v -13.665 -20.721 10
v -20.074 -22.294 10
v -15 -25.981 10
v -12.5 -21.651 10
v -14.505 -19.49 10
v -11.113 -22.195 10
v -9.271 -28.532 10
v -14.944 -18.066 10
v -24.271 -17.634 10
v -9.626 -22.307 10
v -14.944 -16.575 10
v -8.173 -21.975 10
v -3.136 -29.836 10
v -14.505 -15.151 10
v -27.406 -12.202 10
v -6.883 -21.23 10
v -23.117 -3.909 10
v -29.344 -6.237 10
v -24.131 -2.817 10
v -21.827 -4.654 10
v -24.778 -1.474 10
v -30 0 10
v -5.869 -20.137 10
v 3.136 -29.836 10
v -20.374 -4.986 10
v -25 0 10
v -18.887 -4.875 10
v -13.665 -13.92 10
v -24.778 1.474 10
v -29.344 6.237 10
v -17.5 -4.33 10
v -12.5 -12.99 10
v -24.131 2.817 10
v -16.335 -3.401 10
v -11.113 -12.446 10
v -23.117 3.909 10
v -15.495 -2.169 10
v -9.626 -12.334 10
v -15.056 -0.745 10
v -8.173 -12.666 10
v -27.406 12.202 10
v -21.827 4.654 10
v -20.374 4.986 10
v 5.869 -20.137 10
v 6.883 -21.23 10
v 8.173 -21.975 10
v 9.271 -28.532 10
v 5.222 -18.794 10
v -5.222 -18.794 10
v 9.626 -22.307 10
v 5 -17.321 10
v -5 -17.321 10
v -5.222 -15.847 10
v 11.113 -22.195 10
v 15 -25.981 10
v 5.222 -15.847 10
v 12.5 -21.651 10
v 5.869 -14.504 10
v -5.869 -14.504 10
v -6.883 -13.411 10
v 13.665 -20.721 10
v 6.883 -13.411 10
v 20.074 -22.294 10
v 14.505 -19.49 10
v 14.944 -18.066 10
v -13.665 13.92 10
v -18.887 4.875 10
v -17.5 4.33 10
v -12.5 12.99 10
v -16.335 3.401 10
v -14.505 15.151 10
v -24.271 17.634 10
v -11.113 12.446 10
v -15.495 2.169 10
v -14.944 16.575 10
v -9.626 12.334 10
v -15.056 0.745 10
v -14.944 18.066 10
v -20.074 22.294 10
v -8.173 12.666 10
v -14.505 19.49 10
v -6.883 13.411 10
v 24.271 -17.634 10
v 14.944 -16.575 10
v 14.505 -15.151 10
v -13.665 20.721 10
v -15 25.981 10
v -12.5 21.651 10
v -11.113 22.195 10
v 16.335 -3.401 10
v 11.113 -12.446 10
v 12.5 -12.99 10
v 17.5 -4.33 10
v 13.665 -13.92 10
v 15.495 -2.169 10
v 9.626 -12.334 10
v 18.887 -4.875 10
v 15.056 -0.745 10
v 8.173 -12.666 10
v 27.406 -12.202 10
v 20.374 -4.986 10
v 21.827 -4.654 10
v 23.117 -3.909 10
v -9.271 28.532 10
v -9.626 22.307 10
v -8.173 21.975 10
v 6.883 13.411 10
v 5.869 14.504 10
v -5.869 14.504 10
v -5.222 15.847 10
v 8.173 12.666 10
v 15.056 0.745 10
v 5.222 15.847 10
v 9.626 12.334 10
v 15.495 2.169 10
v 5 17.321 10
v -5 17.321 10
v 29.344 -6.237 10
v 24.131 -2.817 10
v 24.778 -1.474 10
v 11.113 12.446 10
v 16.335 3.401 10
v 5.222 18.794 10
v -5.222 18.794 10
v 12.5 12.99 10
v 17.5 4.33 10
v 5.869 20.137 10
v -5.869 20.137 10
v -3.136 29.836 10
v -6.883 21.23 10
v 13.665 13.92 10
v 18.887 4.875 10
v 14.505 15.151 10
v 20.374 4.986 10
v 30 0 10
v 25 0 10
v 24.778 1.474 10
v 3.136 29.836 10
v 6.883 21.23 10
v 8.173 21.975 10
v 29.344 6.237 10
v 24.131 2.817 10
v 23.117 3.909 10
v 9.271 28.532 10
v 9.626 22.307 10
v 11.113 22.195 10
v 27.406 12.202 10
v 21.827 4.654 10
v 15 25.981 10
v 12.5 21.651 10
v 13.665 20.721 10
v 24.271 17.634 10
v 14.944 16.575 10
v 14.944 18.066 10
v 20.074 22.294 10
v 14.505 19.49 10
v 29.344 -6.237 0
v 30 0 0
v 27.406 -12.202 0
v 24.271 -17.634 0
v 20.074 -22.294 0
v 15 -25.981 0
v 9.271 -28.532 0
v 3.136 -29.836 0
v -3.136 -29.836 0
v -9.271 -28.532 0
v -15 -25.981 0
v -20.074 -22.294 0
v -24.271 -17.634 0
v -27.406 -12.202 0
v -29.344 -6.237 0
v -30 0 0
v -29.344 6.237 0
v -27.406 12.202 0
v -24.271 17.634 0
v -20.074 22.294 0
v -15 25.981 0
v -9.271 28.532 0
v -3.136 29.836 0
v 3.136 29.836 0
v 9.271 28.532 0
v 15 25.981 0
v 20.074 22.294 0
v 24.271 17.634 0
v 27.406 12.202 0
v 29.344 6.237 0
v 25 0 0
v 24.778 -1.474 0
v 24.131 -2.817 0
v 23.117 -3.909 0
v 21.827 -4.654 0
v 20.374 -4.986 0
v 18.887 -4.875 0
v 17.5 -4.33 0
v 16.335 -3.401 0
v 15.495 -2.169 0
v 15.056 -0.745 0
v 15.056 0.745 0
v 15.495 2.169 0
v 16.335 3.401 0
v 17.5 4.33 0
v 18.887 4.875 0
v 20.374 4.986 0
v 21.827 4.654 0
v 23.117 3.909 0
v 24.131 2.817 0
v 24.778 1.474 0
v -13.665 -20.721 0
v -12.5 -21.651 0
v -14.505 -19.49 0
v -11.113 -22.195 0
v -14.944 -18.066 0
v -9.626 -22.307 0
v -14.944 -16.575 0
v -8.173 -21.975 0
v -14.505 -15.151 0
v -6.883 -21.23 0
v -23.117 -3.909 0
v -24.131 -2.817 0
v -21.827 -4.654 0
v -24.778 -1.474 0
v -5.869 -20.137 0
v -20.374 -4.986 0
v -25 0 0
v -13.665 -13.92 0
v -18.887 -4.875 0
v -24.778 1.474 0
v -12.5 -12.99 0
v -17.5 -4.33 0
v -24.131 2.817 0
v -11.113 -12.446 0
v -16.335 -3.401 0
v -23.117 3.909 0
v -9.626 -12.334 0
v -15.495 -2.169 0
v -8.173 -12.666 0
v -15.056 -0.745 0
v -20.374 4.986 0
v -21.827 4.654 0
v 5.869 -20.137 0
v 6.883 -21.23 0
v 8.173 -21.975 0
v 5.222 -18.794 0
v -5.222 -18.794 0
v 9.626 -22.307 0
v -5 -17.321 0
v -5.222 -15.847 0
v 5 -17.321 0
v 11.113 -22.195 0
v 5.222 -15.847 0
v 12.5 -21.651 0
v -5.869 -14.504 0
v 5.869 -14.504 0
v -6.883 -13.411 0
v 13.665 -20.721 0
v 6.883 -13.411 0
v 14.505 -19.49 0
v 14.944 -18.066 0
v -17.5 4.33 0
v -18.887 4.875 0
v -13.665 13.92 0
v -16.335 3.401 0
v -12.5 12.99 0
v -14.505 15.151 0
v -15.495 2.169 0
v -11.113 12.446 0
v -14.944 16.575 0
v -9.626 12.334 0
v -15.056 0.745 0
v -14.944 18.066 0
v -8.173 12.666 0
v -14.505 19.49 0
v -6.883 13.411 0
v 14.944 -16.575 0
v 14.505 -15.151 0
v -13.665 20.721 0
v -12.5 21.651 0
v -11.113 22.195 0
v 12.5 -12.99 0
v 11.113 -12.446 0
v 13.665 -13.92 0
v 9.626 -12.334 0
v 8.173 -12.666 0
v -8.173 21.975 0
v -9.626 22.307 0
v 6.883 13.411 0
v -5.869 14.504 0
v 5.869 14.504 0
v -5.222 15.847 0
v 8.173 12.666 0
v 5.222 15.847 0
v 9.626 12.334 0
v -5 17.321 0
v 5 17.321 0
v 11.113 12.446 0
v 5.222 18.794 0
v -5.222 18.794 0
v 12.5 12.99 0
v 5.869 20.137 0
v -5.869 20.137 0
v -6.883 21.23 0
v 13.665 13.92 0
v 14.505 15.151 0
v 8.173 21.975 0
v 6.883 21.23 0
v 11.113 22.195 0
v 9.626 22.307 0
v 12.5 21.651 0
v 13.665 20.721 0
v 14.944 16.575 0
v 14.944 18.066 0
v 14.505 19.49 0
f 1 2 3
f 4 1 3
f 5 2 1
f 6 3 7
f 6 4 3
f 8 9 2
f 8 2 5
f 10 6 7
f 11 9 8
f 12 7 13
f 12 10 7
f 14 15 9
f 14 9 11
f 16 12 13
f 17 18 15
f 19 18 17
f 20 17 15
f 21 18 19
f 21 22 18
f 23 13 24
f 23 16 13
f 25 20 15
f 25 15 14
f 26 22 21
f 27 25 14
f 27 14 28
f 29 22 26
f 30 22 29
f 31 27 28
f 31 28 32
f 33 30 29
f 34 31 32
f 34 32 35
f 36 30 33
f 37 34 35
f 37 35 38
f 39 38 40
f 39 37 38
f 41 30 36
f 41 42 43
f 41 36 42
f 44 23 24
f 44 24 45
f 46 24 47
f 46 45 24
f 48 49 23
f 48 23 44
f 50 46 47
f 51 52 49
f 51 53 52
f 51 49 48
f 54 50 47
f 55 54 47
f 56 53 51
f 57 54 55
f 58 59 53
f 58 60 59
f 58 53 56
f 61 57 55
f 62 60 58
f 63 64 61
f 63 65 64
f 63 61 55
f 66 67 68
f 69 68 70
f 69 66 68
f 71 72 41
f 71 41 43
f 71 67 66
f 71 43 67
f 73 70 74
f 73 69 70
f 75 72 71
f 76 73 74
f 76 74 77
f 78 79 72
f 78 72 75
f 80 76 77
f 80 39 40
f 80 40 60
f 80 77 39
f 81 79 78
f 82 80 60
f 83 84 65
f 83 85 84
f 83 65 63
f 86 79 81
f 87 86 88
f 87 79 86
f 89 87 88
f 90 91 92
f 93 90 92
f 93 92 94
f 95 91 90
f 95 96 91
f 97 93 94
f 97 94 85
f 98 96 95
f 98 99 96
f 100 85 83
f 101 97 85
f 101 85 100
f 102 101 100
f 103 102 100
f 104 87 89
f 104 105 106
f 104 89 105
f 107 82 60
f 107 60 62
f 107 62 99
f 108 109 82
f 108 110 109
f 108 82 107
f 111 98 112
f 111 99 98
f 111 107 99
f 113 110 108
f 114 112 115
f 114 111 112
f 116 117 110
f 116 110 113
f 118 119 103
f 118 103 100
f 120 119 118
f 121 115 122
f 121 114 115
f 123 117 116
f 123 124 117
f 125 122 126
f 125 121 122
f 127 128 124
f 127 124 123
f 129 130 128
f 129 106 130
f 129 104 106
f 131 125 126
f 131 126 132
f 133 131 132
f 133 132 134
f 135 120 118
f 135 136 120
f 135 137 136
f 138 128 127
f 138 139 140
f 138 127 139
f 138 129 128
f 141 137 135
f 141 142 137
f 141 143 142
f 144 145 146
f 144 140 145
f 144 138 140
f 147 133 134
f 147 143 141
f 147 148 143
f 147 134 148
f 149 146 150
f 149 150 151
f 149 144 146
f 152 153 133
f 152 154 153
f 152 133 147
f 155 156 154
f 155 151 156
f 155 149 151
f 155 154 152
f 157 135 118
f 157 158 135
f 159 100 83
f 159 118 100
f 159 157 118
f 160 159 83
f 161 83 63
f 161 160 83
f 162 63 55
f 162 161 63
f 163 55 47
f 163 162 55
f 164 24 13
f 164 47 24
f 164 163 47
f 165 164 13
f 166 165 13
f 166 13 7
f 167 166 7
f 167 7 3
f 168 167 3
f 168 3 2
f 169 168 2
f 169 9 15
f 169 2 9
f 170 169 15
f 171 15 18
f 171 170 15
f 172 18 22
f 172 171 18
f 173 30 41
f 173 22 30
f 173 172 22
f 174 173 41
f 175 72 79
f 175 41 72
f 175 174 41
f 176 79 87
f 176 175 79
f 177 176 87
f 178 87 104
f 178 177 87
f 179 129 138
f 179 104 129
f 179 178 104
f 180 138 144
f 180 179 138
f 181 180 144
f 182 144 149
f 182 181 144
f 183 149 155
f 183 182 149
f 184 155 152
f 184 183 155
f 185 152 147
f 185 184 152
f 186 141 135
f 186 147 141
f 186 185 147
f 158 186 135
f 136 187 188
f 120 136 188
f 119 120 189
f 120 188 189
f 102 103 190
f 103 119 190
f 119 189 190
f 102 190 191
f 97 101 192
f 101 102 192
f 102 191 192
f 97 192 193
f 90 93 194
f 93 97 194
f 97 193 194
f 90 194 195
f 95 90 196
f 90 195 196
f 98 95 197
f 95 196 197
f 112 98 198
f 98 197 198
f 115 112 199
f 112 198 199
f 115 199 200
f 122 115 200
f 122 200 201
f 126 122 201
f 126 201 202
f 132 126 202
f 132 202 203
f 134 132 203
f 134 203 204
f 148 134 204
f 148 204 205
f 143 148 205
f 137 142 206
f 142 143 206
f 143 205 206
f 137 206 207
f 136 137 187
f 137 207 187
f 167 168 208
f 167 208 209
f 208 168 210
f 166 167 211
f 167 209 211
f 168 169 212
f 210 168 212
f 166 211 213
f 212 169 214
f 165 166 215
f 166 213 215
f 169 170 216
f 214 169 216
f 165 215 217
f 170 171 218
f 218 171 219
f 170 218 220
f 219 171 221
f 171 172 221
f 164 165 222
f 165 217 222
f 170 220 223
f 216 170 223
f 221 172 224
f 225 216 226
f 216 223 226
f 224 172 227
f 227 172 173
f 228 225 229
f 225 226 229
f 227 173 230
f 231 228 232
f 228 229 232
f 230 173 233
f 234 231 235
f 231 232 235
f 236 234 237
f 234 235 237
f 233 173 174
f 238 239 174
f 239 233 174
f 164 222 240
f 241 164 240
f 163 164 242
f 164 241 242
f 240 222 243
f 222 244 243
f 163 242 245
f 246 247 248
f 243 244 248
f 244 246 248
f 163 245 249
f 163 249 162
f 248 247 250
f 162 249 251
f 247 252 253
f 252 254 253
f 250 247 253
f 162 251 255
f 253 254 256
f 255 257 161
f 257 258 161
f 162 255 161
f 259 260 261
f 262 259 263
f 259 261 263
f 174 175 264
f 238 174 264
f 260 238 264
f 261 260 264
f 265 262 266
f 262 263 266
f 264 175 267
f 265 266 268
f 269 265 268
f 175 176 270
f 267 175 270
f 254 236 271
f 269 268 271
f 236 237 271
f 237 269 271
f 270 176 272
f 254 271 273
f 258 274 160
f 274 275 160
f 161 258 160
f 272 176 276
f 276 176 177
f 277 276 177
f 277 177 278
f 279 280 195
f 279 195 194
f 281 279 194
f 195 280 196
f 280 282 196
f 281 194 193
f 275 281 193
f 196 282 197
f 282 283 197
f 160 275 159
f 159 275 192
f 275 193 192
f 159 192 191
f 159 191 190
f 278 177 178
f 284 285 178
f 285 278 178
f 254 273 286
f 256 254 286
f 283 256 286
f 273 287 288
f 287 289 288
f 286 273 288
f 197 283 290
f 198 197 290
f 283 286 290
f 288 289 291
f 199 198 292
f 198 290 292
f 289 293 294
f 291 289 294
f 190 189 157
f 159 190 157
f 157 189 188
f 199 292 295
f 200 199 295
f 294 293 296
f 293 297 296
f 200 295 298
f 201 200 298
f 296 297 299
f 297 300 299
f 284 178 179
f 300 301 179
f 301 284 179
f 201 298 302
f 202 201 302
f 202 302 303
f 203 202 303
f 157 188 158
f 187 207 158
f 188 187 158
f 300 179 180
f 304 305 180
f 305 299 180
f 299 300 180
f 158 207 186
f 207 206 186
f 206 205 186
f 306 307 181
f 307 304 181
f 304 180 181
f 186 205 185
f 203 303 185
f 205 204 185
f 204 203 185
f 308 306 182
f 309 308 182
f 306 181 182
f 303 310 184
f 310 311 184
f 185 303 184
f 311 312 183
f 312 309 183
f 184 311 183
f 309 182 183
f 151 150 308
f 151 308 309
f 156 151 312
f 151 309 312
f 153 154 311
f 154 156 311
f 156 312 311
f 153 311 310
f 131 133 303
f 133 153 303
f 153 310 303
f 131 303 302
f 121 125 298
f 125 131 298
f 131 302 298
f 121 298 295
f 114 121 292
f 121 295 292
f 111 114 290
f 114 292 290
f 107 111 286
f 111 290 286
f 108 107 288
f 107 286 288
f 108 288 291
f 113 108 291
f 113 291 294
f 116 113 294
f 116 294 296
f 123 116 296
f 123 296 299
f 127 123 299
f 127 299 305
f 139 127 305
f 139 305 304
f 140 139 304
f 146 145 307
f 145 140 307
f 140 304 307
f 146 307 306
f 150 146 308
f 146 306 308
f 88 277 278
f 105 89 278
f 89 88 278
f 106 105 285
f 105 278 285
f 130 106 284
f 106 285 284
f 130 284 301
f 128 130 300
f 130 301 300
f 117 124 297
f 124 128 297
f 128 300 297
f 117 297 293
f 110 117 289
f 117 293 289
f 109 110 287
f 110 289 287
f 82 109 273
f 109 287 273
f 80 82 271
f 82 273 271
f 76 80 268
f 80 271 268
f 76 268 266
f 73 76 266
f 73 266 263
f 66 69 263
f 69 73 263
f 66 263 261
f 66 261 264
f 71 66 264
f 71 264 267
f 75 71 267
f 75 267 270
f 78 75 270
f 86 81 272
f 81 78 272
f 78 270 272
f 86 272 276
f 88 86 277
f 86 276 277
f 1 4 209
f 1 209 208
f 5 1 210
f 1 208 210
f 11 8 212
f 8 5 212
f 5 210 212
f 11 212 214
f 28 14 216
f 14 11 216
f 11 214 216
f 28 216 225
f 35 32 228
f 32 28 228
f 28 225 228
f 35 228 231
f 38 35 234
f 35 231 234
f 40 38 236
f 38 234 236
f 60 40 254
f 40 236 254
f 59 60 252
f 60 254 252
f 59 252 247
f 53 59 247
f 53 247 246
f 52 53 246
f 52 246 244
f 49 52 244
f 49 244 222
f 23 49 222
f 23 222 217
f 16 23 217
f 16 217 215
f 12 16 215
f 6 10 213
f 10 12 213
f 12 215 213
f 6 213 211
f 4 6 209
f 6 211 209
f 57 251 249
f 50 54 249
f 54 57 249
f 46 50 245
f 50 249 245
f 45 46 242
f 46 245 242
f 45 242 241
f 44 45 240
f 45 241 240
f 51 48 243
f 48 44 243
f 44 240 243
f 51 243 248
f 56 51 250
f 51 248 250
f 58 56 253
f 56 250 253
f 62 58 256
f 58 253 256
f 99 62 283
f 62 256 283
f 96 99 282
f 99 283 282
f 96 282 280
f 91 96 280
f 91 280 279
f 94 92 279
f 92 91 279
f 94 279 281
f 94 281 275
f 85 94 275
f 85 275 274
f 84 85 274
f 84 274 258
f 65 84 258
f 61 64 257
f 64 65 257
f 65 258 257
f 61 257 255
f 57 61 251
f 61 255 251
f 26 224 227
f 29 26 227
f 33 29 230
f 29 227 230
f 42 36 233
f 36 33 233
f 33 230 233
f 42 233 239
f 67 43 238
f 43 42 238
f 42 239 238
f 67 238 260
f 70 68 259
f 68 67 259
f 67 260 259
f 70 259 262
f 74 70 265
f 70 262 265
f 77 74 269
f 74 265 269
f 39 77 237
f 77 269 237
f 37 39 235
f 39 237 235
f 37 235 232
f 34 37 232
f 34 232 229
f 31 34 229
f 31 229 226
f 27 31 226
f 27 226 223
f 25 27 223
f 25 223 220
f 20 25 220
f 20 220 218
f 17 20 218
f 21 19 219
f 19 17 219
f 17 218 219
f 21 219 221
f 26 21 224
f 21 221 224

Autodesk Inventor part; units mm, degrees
ref_plane "YZ Plane" through (0, 0, 0) normal (1, 0, 0) x (0, 1, 0)
ref_plane "XZ Plane" through (0, 0, 0) normal (0, 1, 0) x (-1, 0, 0)
ref_plane "XY Plane" through (0, 0, 0) normal (0, 0, 1) x (1, 0, 0)
sketch "Sketch1" plane through (0, 0, 0) normal (0, 0, 1) x (1, 0, 0)
  circle A0 centre (0, 0) radius 30
extrude "Extrusion1" add sketch "Sketch1" along normal blind 10
sketch "Sketch2" plane through (0, 0, 0) normal (0, 0, 1) x (1, 0, 0)
  circle A0 centre (20, 0) radius 5
extrude "Extrusion2" cut sketch "Sketch2" along normal blind 10
pattern_circular "Circular Pattern1" count 6 over 360 about axis through (0, 0, -10) along (0, 0, 1) of "Extrusion2"
properties part number "22_pocket_circ"
